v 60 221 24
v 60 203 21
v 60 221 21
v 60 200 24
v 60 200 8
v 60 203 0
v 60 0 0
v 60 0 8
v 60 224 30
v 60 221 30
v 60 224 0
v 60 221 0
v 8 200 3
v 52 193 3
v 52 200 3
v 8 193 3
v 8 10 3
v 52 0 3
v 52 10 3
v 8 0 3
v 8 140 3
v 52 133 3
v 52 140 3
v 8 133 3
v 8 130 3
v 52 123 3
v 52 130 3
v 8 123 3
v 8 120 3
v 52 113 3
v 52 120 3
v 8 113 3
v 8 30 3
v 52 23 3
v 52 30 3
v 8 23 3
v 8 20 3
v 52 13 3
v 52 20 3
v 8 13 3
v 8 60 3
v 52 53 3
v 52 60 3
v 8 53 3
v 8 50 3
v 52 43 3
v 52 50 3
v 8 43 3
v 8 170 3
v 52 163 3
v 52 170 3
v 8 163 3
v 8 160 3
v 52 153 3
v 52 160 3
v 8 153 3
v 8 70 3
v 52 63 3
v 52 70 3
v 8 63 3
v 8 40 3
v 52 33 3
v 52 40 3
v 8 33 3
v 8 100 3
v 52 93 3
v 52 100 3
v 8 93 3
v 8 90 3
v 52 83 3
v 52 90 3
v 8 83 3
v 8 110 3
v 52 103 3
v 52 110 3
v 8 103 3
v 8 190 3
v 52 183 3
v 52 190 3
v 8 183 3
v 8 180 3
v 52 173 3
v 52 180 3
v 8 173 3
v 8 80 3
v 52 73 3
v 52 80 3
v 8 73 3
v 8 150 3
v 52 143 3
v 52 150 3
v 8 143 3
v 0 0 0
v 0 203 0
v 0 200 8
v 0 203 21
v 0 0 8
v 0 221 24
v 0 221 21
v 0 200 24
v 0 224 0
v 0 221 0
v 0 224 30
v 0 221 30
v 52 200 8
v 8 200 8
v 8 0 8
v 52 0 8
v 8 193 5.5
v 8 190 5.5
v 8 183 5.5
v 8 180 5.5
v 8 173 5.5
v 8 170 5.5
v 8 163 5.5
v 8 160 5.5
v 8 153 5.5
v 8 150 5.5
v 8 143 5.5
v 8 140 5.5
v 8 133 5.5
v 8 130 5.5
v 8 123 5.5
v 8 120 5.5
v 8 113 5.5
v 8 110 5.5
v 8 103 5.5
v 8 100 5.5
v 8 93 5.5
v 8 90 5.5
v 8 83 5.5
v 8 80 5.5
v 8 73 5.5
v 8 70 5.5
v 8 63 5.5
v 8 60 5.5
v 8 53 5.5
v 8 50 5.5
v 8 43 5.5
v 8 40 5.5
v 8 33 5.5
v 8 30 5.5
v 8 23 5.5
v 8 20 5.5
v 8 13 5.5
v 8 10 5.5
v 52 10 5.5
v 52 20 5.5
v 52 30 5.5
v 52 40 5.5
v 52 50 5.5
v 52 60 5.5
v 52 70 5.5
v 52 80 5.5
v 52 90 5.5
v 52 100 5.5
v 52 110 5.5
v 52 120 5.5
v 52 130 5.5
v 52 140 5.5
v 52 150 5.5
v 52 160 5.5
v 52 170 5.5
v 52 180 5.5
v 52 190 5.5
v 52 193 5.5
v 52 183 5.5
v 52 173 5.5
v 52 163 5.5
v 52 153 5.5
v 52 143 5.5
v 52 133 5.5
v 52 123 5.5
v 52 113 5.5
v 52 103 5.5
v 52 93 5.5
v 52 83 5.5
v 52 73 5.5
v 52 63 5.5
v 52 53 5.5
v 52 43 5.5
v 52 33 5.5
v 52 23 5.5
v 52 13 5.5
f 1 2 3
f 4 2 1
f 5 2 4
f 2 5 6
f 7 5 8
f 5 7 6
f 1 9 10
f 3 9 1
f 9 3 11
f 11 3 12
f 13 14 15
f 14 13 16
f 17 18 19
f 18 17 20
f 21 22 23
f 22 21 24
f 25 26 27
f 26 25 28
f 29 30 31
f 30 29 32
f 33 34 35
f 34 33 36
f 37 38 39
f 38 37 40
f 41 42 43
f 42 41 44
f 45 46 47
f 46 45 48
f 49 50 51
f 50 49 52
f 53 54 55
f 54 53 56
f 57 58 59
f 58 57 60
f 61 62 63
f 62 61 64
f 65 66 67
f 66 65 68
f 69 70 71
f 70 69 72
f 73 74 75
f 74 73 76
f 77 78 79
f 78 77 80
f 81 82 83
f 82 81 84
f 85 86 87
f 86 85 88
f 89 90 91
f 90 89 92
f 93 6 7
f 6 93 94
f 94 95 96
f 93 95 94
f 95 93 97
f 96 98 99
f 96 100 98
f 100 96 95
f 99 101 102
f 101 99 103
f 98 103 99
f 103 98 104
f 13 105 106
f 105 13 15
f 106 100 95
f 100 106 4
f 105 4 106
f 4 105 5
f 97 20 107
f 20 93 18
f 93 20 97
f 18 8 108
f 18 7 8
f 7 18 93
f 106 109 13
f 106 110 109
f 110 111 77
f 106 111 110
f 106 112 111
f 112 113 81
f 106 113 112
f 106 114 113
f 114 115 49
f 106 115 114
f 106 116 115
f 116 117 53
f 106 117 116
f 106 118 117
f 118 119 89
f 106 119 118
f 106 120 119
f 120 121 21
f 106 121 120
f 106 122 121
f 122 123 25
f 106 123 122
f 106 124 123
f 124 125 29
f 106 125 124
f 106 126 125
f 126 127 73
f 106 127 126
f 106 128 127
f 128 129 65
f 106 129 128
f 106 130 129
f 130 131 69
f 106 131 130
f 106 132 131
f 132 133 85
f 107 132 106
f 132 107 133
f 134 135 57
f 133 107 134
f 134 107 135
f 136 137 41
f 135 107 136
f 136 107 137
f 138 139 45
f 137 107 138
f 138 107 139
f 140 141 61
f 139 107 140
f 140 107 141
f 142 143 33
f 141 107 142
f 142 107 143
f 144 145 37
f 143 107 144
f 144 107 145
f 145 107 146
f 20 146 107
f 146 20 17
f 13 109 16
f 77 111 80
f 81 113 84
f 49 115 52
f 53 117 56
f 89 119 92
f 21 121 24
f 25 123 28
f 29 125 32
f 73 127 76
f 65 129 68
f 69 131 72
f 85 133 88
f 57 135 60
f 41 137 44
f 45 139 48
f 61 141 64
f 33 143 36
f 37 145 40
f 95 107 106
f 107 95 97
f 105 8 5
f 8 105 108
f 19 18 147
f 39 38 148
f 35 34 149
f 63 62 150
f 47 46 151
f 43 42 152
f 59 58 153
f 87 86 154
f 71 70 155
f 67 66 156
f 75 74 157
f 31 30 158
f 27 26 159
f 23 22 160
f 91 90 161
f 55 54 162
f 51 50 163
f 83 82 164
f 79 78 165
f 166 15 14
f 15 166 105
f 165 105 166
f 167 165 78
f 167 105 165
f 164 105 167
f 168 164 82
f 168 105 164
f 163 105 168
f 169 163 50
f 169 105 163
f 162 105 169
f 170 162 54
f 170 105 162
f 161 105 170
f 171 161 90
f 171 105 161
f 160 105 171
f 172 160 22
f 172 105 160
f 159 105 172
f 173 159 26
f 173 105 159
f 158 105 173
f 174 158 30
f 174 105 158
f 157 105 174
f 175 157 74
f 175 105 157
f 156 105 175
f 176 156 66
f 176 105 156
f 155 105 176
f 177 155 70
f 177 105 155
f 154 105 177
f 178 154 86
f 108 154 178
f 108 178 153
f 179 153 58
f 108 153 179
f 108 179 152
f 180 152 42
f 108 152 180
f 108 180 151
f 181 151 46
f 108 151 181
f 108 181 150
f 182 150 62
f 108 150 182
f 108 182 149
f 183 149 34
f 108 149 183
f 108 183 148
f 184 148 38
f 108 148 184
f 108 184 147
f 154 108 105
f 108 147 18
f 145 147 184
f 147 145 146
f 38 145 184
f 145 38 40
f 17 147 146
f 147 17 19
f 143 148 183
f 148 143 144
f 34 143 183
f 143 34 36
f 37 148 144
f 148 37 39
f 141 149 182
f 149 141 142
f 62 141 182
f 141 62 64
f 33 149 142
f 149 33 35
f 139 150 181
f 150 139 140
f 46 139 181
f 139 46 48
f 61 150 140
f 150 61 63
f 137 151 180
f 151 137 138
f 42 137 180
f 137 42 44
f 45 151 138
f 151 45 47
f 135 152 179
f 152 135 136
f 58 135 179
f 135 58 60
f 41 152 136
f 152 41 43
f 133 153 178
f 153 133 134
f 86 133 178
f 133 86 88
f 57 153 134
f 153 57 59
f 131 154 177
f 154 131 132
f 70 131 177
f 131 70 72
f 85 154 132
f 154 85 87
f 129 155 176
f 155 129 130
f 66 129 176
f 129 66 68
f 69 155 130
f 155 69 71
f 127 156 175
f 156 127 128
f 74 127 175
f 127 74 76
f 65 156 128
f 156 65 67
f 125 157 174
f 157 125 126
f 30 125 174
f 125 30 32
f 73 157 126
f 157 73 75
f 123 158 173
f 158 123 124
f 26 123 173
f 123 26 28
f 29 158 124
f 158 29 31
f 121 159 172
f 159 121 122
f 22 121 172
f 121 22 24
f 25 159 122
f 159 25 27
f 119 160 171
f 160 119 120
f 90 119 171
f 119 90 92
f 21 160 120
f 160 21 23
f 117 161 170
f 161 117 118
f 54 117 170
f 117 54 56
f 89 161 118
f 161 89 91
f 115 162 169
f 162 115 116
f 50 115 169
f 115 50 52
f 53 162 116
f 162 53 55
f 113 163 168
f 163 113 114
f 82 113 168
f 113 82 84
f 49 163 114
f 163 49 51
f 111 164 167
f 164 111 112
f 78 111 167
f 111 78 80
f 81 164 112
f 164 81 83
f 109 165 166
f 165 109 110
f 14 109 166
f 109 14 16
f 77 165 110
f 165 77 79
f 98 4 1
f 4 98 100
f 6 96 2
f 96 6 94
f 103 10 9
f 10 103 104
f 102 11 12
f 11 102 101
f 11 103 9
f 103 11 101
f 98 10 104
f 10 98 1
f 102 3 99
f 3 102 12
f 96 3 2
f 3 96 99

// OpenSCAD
// Ausstiegshilfe / Rettungsrampe - parametrische Druckvorlage
// Projekt: naturdruck-baukasten-fablab / Hebel: 3d-ausstiegshilfen-kleintiere, zaeune-schaechte-fallen
// Lizenz: CERN-OHL-S bzw. CC-BY-SA 4.0
//
// Zweck: Insekten, Amphibien, Kleinsaeuger ertrinken massenhaft in Regentonnen,
// Viehtraenken, Gullys, Lichtschaechten. Eine griffige, flach genug geneigte Rampe
// mit Querstegen (Grip) und einem Haken ueber den Rand rettet sie - Cent-Betraege.
//
// Prinzip-Kennwerte:
//  - Neigung <= 45 Grad (flacher = besser), Oberflaeche griffig (Querstege)
//  - Haken/Lippe haengt ueber den Behaelterrand, Rampe reicht bis unter Wasserlinie
//  - Seitenwaende verhindern Abrutschen
//
// Druck: PETG/ASA (witterungs-/UV-fest). Schwimmfaehige Variante: an Rampenende
//  kleinen Hohlkoerper/Kork ankleben, damit sie dem Wasserstand folgt.

/* [Rampe] */
laenge      = 200;   // mm Rampenlaenge
breite      = 60;    // mm
dicke       = 3;     // mm Grundplatte
seitenwand  = 8;     // mm Hoehe Seitenwaende
/* [Grip] */
steg_hoehe  = 2.5;   // mm Querstege
steg_breite = 3;     // mm
steg_abstand= 10;    // mm Mitte-zu-Mitte
/* [Haken ueber den Rand] */
rand_dicke  = 18;    // mm Materialstaerke des Behaelterrands (z.B. Regentonne)
haken_tief  = 30;    // mm wie weit der Haken aussen herunterreicht

$fn = 32;

module grundplatte() {
    cube([breite, laenge, dicke]);
    // Seitenwaende
    cube([seitenwand, laenge, seitenwand]);
    translate([breite - seitenwand, 0, 0]) cube([seitenwand, laenge, seitenwand]);
}

module querstege() {
    n = floor(laenge / steg_abstand);
    for (i = [1:n-1])
        translate([seitenwand, i*steg_abstand, dicke])
            cube([breite - 2*seitenwand, steg_breite, steg_hoehe]);
}

module haken() {
    // U-foermiger Haken am oberen Ende, greift ueber den Behaelterrand
    translate([0, laenge, 0]) {
        cube([breite, dicke, rand_dicke + 2*dicke]);                 // Innenwange (Behaelterseite)
        translate([0, dicke + rand_dicke, 0])
            cube([breite, dicke, haken_tief]);                        // Aussenwange
        translate([0, 0, rand_dicke + dicke])
            cube([breite, dicke + rand_dicke + dicke, dicke]);        // Steg oben
    }
}

union() {
    grundplatte();
    querstege();
    haken();
}
